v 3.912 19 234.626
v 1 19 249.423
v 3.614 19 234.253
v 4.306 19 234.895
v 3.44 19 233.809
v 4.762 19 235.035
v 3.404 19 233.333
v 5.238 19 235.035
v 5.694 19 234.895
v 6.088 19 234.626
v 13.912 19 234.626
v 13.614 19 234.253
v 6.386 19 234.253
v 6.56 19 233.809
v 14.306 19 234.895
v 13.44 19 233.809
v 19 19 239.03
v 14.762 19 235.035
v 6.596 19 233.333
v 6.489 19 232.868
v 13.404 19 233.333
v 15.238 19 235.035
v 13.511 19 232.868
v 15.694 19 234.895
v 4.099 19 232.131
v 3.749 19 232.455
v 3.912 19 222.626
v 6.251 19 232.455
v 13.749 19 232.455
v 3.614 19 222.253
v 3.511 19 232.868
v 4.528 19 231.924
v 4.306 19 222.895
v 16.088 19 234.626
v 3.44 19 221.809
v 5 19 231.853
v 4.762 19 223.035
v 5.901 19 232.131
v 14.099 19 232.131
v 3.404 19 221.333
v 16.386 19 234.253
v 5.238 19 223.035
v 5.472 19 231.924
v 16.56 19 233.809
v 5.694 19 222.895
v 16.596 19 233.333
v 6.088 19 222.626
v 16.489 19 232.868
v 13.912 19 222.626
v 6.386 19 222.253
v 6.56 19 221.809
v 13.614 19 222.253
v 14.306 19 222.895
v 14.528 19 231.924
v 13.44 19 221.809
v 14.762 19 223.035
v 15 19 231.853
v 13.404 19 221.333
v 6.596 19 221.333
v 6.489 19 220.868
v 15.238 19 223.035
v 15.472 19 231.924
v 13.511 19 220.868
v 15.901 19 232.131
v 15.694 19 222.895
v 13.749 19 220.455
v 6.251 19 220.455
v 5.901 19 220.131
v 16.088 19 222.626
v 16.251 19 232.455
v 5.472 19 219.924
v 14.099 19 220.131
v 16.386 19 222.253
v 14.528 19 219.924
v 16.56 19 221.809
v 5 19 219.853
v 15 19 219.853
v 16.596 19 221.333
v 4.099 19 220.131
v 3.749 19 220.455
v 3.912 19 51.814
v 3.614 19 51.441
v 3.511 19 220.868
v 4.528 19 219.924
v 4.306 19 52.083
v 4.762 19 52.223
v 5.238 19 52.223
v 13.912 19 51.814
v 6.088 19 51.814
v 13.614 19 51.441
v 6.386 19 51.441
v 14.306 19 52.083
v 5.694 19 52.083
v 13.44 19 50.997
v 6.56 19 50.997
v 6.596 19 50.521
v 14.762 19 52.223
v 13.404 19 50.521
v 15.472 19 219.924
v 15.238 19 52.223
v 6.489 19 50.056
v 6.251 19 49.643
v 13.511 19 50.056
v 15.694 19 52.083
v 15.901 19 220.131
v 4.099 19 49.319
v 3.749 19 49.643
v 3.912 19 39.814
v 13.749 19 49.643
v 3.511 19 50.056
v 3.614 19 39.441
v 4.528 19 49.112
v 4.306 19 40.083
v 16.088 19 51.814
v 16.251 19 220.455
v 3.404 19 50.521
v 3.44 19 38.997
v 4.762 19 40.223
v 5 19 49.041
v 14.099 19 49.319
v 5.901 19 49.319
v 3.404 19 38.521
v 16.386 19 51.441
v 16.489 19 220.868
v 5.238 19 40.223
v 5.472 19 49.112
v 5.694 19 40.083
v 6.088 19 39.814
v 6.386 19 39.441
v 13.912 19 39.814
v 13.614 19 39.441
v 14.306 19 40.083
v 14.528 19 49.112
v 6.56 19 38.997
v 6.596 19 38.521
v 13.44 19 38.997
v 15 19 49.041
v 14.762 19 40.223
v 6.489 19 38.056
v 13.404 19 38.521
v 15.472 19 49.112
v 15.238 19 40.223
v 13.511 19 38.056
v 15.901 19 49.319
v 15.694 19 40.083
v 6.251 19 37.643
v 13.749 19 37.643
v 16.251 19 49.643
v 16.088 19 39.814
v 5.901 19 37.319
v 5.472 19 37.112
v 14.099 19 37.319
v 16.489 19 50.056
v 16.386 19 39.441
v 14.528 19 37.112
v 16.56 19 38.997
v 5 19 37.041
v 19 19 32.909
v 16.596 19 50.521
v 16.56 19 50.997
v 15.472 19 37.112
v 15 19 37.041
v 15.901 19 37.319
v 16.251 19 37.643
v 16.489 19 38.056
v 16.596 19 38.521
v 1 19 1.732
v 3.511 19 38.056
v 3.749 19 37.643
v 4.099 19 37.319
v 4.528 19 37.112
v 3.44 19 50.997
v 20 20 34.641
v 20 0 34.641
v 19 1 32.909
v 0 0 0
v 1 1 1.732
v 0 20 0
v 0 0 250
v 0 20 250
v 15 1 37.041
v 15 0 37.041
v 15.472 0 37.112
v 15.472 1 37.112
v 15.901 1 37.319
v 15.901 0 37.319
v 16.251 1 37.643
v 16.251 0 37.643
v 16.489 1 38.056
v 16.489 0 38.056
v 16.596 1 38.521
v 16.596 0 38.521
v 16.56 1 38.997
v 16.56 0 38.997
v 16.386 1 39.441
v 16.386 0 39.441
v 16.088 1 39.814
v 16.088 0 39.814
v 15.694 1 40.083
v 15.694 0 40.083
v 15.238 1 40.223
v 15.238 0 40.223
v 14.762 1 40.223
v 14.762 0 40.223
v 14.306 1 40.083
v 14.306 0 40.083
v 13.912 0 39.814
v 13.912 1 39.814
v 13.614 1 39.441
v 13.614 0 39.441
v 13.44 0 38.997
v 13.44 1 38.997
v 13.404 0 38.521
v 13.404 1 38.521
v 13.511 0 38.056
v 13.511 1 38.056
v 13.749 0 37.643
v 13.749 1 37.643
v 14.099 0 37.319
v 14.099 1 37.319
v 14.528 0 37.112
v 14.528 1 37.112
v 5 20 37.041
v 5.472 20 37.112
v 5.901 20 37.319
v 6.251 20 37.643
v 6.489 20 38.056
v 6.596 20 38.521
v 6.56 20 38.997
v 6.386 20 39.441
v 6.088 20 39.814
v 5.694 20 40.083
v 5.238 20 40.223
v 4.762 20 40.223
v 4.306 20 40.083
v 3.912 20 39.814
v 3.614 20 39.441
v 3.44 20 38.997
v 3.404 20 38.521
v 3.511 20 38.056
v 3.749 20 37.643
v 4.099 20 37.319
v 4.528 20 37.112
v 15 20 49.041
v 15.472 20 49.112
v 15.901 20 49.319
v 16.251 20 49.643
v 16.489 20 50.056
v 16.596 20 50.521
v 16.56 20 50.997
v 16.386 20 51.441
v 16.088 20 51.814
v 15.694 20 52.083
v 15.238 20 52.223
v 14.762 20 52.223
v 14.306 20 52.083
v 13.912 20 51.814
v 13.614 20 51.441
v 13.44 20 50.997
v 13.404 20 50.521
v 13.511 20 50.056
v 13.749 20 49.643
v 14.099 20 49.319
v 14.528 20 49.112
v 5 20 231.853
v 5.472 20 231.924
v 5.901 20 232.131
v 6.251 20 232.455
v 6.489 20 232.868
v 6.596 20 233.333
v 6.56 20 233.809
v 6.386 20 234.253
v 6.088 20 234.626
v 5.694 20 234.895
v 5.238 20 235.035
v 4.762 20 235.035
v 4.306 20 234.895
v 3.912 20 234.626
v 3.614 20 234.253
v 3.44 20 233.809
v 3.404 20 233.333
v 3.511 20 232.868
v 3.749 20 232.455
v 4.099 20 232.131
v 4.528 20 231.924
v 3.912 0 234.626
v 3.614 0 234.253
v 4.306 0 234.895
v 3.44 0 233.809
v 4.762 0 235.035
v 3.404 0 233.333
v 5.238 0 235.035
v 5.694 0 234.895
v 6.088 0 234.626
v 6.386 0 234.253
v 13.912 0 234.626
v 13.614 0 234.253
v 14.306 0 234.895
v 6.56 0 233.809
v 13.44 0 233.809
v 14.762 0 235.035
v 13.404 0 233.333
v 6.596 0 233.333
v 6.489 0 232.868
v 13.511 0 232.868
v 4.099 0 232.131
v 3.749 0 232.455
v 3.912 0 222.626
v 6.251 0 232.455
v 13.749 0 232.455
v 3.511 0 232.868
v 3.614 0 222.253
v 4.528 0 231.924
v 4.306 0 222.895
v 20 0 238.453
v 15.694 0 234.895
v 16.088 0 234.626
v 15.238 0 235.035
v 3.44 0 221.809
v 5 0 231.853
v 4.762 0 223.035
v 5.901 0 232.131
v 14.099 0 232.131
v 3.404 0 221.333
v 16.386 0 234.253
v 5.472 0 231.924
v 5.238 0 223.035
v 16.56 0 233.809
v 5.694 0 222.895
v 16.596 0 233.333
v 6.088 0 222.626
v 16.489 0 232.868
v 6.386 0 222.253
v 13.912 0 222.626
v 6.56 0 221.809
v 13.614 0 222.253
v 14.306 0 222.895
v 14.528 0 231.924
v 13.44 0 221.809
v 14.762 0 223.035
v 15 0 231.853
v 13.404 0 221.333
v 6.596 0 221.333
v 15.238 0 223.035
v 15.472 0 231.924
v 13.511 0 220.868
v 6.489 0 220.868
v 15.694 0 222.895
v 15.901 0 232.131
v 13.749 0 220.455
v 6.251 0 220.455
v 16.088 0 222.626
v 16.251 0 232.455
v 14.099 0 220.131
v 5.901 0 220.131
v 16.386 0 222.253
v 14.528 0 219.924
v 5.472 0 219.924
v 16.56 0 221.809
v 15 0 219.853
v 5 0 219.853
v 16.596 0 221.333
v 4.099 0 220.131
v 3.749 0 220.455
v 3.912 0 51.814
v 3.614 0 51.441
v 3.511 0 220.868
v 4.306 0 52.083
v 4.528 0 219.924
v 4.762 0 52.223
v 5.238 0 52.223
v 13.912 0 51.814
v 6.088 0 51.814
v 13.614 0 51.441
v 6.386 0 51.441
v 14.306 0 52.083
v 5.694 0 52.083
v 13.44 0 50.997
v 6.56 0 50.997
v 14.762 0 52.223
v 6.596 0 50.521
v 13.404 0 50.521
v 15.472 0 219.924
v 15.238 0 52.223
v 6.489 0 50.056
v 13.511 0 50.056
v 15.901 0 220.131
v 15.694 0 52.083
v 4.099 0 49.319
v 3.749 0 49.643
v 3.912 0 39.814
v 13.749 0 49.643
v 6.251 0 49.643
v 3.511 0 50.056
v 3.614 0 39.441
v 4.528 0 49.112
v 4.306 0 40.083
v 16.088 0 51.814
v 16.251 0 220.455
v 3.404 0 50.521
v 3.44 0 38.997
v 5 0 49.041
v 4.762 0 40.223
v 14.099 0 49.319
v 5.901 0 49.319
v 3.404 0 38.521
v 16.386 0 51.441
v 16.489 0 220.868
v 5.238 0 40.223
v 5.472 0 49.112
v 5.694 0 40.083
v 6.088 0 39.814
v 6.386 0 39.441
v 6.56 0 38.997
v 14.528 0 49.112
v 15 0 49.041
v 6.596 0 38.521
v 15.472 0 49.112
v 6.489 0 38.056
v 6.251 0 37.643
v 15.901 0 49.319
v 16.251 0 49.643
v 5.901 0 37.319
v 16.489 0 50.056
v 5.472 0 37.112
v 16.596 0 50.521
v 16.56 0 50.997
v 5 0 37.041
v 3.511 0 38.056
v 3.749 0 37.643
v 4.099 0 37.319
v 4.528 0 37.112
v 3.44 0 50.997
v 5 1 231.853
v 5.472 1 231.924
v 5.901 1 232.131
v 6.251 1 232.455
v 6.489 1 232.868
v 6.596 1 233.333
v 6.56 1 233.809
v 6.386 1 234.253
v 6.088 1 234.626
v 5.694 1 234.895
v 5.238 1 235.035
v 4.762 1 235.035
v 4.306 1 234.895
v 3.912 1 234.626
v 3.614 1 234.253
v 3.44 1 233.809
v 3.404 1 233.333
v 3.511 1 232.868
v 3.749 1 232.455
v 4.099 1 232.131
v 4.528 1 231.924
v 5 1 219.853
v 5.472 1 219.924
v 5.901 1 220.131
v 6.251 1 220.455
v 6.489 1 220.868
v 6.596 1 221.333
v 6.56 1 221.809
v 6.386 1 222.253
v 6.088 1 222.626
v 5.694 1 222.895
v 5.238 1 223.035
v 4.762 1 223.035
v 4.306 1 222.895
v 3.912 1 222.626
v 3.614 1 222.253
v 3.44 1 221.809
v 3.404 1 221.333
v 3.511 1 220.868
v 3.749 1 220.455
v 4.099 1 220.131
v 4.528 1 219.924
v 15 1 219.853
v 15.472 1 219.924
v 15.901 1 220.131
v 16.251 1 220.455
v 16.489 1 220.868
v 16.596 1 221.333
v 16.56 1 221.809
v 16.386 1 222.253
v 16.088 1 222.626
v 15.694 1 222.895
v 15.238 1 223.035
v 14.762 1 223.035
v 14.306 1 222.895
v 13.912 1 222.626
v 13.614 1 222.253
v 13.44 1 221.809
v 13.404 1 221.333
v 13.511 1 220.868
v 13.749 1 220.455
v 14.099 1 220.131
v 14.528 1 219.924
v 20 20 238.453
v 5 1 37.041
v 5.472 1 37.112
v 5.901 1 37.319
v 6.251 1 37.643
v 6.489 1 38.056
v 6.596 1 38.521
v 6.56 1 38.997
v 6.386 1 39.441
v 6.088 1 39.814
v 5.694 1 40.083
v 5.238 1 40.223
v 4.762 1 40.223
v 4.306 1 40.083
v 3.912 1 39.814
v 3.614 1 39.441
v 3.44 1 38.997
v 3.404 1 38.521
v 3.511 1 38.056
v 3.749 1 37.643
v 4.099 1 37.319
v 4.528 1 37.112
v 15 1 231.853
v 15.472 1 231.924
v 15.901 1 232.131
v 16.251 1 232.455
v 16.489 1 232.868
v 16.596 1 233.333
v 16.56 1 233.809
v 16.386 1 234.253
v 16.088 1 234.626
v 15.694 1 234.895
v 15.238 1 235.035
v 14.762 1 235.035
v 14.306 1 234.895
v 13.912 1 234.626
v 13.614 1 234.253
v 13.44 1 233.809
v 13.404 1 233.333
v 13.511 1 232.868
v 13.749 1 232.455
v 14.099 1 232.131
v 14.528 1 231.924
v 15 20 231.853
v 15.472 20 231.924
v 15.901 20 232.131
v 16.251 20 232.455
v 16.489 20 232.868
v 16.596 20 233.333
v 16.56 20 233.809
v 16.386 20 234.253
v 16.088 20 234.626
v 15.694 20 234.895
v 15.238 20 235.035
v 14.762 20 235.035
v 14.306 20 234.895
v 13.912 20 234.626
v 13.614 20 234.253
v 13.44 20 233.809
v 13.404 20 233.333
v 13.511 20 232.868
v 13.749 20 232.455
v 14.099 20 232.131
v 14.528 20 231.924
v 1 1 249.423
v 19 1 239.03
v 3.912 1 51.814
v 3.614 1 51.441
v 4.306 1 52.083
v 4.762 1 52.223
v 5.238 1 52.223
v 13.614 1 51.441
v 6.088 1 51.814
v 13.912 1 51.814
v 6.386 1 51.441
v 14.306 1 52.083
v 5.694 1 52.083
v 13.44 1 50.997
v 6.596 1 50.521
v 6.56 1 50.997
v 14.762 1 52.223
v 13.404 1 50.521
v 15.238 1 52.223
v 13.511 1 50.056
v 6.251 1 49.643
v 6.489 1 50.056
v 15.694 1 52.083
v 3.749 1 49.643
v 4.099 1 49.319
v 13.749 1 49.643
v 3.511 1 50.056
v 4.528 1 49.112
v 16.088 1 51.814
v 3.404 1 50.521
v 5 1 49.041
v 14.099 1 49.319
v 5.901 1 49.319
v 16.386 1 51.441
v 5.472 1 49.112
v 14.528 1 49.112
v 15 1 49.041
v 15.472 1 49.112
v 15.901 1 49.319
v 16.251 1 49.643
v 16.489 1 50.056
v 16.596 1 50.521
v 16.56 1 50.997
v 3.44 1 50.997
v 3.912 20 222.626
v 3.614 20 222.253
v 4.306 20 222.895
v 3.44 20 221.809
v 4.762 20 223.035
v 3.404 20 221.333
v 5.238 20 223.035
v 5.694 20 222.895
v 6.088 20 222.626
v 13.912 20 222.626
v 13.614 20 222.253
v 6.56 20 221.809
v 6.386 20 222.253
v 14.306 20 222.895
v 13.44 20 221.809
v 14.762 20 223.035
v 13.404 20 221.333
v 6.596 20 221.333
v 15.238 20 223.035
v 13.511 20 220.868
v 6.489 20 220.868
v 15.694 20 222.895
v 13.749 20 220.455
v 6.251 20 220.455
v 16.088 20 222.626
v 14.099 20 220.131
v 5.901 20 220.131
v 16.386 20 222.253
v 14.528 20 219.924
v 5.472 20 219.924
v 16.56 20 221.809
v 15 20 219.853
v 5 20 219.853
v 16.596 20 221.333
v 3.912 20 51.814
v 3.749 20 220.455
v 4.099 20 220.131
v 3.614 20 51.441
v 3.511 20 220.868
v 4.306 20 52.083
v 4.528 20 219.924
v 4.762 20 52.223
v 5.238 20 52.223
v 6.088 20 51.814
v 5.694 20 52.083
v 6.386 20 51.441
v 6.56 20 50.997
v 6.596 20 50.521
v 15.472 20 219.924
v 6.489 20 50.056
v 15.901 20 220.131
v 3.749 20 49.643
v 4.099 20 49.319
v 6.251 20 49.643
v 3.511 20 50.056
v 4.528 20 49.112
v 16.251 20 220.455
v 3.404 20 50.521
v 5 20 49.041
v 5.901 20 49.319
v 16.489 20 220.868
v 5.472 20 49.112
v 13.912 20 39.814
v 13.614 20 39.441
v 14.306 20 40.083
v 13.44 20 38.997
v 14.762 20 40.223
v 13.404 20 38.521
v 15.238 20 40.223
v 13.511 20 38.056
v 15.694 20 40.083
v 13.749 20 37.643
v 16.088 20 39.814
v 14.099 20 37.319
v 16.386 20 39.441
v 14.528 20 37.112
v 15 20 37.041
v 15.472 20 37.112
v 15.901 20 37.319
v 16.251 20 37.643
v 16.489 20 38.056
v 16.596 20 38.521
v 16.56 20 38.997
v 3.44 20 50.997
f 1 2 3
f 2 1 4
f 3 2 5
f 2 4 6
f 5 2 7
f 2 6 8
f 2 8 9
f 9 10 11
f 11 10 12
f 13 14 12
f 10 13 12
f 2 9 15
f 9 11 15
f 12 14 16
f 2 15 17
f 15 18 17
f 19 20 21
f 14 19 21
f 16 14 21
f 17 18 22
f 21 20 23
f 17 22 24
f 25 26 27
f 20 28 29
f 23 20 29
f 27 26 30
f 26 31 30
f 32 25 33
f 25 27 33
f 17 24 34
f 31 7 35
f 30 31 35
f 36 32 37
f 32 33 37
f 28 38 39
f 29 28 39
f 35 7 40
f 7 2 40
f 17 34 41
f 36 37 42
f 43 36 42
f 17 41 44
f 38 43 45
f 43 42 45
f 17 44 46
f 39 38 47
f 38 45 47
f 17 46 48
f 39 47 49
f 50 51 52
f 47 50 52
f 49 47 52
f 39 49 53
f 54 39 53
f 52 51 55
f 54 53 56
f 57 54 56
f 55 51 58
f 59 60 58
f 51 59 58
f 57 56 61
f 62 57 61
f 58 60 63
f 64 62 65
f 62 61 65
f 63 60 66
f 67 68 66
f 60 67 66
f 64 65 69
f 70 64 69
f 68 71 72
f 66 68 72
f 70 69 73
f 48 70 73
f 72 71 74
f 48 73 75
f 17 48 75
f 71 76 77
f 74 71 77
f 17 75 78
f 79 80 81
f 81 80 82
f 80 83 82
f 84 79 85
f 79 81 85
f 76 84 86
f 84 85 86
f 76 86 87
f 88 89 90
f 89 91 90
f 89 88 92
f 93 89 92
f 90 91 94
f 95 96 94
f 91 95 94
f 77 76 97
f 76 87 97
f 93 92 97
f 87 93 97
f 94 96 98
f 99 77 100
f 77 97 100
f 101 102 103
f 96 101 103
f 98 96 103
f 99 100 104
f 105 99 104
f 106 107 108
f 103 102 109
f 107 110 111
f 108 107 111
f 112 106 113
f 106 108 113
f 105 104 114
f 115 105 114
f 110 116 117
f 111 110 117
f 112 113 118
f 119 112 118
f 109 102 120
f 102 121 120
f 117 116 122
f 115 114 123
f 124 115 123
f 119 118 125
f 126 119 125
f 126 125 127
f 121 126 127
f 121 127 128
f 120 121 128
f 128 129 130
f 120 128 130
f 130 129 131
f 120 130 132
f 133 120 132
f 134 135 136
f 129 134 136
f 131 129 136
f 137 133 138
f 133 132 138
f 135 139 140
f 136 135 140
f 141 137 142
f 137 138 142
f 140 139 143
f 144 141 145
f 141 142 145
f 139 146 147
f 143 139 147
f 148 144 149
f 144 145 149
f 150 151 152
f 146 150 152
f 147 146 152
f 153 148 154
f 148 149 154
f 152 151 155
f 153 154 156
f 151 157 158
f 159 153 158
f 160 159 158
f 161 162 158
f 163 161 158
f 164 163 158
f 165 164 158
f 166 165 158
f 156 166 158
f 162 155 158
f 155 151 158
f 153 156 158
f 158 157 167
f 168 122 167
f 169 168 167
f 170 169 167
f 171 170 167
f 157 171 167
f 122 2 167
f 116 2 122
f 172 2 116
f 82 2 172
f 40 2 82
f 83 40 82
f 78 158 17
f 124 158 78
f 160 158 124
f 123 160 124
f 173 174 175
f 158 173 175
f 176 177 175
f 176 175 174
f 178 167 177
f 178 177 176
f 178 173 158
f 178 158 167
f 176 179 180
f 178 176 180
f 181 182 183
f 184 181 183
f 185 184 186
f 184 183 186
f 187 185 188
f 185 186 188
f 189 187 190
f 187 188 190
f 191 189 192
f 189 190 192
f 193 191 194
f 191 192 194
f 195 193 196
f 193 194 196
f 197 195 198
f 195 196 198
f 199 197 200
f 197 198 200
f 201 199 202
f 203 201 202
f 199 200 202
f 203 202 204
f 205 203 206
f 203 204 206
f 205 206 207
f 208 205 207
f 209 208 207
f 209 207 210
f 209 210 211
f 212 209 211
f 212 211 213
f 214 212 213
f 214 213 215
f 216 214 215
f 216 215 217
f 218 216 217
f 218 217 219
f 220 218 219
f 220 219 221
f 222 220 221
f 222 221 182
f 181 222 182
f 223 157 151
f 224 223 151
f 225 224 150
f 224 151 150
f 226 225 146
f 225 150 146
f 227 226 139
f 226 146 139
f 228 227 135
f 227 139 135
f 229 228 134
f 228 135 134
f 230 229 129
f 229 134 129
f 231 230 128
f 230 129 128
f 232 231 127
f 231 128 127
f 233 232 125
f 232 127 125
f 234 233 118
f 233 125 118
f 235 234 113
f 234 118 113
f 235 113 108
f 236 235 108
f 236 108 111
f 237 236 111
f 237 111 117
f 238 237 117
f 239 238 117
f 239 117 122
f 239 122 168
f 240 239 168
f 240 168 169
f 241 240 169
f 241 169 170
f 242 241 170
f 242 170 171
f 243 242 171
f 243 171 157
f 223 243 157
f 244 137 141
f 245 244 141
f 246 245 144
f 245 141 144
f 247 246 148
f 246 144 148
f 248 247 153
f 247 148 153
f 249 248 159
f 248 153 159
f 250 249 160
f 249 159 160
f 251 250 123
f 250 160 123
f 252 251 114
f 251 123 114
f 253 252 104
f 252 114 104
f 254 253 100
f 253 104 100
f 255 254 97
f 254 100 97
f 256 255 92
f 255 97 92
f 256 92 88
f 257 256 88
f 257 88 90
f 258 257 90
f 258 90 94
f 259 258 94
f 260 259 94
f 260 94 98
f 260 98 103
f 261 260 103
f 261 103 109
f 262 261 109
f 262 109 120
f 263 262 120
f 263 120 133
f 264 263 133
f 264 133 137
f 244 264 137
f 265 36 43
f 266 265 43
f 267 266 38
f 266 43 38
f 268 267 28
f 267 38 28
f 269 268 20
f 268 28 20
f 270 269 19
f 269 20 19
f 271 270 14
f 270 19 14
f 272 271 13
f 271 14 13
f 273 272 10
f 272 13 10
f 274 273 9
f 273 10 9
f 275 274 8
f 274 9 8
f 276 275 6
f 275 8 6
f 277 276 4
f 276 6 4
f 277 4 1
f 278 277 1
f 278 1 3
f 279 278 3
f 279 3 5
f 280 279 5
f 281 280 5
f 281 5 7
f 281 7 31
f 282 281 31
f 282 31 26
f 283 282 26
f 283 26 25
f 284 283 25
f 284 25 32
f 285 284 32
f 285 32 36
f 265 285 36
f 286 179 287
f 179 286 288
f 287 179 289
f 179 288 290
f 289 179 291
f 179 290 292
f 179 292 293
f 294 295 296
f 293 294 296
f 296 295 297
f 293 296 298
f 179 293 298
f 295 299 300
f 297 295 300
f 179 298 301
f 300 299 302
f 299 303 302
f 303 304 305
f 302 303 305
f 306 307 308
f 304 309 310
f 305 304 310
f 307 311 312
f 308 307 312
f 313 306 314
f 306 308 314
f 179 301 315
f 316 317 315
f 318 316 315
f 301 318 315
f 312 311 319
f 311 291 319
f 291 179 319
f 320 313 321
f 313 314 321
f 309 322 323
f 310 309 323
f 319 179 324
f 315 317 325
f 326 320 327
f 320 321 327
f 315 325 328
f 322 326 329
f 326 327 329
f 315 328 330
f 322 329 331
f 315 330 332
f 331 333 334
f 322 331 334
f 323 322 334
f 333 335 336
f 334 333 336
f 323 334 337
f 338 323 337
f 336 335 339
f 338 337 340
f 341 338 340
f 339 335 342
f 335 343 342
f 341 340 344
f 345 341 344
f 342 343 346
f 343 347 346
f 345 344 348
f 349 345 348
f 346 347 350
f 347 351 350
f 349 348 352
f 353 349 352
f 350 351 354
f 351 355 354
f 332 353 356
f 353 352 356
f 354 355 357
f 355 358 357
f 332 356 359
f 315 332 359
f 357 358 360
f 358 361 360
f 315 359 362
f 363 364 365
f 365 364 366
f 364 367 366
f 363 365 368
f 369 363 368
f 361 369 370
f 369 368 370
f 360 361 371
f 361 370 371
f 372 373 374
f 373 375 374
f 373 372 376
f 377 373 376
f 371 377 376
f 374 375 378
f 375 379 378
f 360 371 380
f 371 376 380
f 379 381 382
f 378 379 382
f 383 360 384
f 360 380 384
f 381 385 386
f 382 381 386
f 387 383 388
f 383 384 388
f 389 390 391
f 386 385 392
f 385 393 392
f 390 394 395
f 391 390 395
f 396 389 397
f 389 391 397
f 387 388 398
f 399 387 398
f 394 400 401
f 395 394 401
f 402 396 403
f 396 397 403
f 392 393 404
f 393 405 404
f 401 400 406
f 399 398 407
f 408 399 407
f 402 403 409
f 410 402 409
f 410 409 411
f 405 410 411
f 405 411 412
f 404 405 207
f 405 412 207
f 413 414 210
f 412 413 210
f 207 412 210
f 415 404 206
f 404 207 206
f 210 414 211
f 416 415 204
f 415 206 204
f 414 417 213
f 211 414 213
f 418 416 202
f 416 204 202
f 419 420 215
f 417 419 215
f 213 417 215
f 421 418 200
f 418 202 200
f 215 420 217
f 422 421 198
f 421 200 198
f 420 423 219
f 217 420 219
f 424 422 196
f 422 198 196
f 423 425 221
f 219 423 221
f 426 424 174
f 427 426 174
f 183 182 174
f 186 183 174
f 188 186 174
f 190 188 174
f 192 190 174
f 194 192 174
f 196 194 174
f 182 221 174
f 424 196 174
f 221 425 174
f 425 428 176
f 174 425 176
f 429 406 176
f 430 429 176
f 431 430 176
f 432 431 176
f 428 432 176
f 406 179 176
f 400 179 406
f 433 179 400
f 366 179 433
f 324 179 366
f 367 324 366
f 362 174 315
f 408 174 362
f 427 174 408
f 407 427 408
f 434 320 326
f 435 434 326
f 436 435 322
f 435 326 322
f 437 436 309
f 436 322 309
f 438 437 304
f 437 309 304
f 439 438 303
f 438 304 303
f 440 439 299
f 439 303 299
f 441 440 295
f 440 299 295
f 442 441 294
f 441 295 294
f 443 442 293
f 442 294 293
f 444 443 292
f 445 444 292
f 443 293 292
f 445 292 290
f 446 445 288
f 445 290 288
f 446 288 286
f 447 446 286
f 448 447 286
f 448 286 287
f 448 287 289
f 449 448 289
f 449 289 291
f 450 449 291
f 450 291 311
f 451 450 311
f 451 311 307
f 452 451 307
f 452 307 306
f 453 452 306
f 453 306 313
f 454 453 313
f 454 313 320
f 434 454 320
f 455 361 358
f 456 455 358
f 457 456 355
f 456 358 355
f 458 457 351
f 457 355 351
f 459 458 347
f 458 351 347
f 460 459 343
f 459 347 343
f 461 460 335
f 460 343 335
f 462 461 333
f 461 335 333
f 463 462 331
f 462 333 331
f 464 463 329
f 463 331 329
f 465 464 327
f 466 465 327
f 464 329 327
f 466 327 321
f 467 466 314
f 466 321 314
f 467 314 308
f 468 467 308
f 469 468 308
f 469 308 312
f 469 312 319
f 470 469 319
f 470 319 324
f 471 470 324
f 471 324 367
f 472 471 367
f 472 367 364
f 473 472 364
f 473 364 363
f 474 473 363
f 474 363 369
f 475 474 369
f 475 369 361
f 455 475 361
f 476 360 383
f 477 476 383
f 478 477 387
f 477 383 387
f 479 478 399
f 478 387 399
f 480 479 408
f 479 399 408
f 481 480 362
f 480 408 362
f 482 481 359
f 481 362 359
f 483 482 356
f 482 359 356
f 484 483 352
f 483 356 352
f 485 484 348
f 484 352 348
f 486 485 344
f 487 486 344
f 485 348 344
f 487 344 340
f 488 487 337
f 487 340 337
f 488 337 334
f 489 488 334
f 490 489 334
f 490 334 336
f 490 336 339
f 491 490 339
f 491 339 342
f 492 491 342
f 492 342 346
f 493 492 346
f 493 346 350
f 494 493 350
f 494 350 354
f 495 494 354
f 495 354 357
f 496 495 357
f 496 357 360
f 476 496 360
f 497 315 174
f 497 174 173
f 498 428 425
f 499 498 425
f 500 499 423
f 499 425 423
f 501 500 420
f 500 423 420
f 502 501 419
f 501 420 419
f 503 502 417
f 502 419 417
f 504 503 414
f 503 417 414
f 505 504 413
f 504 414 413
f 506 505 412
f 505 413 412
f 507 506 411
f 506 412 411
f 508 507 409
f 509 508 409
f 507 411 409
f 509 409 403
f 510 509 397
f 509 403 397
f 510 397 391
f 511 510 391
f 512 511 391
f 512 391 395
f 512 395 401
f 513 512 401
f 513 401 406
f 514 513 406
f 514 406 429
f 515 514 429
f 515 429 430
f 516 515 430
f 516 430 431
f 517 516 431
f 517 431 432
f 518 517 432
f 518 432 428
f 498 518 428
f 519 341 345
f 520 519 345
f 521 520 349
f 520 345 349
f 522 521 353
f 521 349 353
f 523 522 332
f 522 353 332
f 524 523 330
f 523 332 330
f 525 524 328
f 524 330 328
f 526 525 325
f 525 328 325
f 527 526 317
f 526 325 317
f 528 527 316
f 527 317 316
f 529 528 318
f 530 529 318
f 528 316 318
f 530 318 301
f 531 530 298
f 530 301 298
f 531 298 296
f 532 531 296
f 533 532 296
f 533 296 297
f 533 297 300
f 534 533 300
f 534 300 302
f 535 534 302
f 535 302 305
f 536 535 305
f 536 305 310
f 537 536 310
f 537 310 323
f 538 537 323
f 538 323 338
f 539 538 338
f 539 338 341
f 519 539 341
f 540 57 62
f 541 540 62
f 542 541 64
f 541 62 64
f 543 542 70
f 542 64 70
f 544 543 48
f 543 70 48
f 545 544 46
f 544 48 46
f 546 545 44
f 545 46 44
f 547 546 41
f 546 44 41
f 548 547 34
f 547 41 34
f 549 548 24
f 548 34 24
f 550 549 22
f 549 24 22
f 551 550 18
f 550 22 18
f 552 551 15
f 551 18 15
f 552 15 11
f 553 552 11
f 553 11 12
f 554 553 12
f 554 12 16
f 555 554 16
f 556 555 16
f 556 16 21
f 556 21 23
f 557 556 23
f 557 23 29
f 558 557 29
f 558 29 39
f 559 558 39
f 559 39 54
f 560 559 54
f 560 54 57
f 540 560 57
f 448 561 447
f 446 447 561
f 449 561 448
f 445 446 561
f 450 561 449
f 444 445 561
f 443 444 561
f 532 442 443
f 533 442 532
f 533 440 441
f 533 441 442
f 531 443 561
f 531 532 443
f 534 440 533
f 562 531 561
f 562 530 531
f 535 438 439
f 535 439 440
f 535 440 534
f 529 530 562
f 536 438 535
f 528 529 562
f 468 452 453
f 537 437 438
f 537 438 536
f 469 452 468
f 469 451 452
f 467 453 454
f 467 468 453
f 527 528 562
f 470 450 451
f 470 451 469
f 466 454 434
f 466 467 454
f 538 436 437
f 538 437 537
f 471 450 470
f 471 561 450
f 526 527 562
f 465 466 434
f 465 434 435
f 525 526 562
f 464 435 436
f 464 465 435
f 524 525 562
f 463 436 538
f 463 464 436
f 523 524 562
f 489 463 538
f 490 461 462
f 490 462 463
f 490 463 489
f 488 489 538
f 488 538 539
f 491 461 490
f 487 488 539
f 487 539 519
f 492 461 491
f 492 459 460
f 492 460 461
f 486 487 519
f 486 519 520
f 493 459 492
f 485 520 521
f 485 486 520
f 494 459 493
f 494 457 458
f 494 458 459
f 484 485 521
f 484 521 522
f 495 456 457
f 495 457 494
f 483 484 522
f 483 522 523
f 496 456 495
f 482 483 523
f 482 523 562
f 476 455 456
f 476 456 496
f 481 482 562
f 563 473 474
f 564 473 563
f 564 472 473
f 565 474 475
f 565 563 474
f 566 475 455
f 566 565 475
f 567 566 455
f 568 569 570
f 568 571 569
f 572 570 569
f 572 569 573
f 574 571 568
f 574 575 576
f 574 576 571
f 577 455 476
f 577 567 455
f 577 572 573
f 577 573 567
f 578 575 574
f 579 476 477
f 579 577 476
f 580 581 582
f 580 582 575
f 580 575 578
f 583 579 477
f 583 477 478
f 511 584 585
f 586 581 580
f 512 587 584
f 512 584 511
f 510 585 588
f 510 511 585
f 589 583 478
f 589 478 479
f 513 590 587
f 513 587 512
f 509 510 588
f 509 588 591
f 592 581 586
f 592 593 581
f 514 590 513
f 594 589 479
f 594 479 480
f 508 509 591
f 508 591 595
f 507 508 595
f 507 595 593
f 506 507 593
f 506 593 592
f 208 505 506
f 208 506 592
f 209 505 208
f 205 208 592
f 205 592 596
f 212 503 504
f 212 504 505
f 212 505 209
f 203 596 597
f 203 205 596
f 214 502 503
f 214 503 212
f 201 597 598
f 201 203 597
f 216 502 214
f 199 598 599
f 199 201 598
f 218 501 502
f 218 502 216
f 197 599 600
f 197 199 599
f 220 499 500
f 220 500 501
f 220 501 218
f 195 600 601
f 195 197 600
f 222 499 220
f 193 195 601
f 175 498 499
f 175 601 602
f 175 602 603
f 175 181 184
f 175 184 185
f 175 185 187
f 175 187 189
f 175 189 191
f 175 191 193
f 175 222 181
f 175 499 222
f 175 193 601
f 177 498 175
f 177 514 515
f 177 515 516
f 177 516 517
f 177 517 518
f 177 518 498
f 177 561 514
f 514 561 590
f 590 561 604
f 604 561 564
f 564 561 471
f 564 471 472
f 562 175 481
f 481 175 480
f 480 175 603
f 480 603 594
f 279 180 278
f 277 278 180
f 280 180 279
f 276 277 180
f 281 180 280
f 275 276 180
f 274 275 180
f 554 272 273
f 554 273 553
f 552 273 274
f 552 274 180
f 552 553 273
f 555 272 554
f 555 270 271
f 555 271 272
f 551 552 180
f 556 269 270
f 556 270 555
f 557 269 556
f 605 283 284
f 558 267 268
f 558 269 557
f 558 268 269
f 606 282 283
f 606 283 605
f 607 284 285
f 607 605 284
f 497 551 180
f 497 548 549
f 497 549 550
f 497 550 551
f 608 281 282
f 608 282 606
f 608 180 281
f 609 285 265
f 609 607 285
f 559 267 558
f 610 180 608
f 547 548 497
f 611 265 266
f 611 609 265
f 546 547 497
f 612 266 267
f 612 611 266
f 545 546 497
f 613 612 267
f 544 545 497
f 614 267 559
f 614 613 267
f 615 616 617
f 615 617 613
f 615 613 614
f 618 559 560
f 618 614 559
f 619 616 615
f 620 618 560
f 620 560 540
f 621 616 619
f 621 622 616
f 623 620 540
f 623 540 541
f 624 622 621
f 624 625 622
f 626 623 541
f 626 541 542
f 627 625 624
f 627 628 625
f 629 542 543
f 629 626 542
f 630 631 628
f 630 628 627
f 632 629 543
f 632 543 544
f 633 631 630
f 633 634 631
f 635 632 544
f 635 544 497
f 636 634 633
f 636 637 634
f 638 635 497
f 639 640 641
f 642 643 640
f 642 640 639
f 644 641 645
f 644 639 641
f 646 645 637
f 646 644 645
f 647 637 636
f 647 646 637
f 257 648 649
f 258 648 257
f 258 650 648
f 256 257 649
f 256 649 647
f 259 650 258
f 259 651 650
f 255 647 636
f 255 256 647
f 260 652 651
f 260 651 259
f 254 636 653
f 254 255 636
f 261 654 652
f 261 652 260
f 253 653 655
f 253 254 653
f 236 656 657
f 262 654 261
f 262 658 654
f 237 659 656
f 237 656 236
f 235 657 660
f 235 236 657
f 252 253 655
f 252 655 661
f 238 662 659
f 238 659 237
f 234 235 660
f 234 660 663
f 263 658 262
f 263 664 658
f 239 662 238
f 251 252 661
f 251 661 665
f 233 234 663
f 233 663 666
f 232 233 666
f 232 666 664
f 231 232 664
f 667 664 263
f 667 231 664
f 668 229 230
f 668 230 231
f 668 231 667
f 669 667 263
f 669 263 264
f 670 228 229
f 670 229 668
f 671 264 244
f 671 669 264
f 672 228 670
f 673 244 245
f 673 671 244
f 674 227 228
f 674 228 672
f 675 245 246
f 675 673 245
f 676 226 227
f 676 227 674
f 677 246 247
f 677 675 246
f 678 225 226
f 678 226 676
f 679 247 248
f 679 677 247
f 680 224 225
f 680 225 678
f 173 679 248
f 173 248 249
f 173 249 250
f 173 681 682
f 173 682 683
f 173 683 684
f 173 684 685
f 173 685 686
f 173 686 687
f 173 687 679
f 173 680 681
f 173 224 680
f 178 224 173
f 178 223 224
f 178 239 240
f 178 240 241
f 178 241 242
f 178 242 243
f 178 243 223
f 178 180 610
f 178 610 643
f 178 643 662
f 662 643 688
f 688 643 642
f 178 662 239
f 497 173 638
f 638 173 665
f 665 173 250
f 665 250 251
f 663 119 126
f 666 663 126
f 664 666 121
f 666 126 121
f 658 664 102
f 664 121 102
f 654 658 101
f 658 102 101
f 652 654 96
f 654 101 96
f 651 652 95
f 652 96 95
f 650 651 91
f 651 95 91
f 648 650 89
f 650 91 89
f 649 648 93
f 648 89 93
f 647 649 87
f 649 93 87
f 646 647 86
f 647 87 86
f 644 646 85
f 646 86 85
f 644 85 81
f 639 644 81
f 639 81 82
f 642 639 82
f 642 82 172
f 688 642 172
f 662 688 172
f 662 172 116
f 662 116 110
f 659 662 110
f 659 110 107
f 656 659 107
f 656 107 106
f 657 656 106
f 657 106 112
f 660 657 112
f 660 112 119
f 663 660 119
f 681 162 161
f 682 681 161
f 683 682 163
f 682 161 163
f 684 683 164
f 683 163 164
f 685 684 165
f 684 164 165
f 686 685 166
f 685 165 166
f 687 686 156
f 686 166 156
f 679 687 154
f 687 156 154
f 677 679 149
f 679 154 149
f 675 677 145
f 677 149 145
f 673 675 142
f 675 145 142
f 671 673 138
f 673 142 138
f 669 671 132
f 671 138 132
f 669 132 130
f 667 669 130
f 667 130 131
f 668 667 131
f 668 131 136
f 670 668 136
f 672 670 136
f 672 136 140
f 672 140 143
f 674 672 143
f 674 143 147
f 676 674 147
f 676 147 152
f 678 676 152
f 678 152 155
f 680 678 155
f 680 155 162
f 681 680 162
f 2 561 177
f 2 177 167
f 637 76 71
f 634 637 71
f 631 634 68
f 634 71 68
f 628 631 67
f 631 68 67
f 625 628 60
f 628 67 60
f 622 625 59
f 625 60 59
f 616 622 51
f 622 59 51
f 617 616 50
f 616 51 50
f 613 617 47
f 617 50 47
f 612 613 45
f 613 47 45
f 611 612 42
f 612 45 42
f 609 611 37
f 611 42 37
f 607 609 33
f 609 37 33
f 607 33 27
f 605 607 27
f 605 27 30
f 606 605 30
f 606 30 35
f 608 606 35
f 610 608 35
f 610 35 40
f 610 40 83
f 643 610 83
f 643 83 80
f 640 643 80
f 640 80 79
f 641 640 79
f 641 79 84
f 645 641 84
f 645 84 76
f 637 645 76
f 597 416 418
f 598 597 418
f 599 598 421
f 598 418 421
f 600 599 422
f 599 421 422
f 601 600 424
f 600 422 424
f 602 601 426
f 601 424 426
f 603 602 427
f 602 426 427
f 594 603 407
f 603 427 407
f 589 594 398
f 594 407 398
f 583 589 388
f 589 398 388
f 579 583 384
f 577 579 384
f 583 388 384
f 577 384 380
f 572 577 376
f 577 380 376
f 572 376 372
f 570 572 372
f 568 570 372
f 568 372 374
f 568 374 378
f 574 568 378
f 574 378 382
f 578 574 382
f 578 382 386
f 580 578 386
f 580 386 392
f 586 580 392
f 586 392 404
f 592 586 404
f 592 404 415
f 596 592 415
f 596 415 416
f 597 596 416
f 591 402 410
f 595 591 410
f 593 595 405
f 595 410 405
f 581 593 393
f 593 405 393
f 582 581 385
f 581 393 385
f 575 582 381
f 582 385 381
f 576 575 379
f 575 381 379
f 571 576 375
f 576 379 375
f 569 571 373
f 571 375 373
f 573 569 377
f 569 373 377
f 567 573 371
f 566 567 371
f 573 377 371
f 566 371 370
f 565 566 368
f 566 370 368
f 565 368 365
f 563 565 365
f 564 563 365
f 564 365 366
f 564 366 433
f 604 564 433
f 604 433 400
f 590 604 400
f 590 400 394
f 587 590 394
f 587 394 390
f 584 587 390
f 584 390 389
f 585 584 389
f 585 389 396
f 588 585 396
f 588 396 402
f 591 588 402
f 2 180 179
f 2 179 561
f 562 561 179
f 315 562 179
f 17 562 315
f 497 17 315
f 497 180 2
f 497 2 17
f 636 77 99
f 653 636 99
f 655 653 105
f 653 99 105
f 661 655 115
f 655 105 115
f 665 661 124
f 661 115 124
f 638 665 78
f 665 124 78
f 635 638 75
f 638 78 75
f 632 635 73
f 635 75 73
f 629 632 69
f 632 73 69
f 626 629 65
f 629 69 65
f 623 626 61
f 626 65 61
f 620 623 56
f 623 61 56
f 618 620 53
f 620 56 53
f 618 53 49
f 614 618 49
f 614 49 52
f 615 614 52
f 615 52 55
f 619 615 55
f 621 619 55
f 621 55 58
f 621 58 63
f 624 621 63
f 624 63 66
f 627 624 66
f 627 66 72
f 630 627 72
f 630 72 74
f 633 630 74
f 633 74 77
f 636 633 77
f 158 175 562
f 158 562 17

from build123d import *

# Parameters (mm, degrees)
SKETCH_1_W          = 20
SKETCH_1_H          = 20
SKETCH_1_W_2        = 18
SKETCH_1_H_2        = 18
EXTRUDE_1_DEPTH     = 250
CUT_EXTRUDE_1_DEPTH = 120
SKETCH_3_R          = 1.6
CUT_EXTRUDE_2_DEPTH = 252.594912508


with BuildPart() as part:
    # 草图1 → 凸台-拉伸1 (new body)
    with BuildSketch(Plane.XY):
        with Locations((10, 10)):
            Rectangle(SKETCH_1_W, SKETCH_1_H)
        with Locations((10, 10)):
            Rectangle(SKETCH_1_W_2, SKETCH_1_H_2, mode=Mode.SUBTRACT)
    extrude(amount=EXTRUDE_1_DEPTH)

    # 草图2 → 切除-拉伸1 (cut)
    with BuildSketch(Plane(origin=(0, 20, 0), x_dir=(1, 0, 0), z_dir=(0, 1, 0))):
        Polygon((0, 0), (20, 0), (20, -34.641016151), align=None)
        Polygon((0, -250), (20, -238.452994616), (20, -250), align=None)
    extrude(amount=-CUT_EXTRUDE_1_DEPTH, mode=Mode.SUBTRACT)

    # 草图3 → 切除-拉伸2 (cut, through all)
    with BuildSketch(Plane.XZ):
        with Locations((5, 233.452994616)):
            Circle(SKETCH_3_R)
        with Locations((15, 233.452994616)):
            Circle(SKETCH_3_R)
        with Locations((15, 221.452994616)):
            Circle(SKETCH_3_R)
        with Locations((5, 221.452994616)):
            Circle(SKETCH_3_R)
        with Locations((15, 38.641016151)):
            Circle(SKETCH_3_R)
        with Locations((5, 38.641016151)):
            Circle(SKETCH_3_R)
        with Locations((15, 50.641016151)):
            Circle(SKETCH_3_R)
        with Locations((5, 50.641016151)):
            Circle(SKETCH_3_R)
    extrude(amount=-CUT_EXTRUDE_2_DEPTH, mode=Mode.SUBTRACT)


solid = part.part
